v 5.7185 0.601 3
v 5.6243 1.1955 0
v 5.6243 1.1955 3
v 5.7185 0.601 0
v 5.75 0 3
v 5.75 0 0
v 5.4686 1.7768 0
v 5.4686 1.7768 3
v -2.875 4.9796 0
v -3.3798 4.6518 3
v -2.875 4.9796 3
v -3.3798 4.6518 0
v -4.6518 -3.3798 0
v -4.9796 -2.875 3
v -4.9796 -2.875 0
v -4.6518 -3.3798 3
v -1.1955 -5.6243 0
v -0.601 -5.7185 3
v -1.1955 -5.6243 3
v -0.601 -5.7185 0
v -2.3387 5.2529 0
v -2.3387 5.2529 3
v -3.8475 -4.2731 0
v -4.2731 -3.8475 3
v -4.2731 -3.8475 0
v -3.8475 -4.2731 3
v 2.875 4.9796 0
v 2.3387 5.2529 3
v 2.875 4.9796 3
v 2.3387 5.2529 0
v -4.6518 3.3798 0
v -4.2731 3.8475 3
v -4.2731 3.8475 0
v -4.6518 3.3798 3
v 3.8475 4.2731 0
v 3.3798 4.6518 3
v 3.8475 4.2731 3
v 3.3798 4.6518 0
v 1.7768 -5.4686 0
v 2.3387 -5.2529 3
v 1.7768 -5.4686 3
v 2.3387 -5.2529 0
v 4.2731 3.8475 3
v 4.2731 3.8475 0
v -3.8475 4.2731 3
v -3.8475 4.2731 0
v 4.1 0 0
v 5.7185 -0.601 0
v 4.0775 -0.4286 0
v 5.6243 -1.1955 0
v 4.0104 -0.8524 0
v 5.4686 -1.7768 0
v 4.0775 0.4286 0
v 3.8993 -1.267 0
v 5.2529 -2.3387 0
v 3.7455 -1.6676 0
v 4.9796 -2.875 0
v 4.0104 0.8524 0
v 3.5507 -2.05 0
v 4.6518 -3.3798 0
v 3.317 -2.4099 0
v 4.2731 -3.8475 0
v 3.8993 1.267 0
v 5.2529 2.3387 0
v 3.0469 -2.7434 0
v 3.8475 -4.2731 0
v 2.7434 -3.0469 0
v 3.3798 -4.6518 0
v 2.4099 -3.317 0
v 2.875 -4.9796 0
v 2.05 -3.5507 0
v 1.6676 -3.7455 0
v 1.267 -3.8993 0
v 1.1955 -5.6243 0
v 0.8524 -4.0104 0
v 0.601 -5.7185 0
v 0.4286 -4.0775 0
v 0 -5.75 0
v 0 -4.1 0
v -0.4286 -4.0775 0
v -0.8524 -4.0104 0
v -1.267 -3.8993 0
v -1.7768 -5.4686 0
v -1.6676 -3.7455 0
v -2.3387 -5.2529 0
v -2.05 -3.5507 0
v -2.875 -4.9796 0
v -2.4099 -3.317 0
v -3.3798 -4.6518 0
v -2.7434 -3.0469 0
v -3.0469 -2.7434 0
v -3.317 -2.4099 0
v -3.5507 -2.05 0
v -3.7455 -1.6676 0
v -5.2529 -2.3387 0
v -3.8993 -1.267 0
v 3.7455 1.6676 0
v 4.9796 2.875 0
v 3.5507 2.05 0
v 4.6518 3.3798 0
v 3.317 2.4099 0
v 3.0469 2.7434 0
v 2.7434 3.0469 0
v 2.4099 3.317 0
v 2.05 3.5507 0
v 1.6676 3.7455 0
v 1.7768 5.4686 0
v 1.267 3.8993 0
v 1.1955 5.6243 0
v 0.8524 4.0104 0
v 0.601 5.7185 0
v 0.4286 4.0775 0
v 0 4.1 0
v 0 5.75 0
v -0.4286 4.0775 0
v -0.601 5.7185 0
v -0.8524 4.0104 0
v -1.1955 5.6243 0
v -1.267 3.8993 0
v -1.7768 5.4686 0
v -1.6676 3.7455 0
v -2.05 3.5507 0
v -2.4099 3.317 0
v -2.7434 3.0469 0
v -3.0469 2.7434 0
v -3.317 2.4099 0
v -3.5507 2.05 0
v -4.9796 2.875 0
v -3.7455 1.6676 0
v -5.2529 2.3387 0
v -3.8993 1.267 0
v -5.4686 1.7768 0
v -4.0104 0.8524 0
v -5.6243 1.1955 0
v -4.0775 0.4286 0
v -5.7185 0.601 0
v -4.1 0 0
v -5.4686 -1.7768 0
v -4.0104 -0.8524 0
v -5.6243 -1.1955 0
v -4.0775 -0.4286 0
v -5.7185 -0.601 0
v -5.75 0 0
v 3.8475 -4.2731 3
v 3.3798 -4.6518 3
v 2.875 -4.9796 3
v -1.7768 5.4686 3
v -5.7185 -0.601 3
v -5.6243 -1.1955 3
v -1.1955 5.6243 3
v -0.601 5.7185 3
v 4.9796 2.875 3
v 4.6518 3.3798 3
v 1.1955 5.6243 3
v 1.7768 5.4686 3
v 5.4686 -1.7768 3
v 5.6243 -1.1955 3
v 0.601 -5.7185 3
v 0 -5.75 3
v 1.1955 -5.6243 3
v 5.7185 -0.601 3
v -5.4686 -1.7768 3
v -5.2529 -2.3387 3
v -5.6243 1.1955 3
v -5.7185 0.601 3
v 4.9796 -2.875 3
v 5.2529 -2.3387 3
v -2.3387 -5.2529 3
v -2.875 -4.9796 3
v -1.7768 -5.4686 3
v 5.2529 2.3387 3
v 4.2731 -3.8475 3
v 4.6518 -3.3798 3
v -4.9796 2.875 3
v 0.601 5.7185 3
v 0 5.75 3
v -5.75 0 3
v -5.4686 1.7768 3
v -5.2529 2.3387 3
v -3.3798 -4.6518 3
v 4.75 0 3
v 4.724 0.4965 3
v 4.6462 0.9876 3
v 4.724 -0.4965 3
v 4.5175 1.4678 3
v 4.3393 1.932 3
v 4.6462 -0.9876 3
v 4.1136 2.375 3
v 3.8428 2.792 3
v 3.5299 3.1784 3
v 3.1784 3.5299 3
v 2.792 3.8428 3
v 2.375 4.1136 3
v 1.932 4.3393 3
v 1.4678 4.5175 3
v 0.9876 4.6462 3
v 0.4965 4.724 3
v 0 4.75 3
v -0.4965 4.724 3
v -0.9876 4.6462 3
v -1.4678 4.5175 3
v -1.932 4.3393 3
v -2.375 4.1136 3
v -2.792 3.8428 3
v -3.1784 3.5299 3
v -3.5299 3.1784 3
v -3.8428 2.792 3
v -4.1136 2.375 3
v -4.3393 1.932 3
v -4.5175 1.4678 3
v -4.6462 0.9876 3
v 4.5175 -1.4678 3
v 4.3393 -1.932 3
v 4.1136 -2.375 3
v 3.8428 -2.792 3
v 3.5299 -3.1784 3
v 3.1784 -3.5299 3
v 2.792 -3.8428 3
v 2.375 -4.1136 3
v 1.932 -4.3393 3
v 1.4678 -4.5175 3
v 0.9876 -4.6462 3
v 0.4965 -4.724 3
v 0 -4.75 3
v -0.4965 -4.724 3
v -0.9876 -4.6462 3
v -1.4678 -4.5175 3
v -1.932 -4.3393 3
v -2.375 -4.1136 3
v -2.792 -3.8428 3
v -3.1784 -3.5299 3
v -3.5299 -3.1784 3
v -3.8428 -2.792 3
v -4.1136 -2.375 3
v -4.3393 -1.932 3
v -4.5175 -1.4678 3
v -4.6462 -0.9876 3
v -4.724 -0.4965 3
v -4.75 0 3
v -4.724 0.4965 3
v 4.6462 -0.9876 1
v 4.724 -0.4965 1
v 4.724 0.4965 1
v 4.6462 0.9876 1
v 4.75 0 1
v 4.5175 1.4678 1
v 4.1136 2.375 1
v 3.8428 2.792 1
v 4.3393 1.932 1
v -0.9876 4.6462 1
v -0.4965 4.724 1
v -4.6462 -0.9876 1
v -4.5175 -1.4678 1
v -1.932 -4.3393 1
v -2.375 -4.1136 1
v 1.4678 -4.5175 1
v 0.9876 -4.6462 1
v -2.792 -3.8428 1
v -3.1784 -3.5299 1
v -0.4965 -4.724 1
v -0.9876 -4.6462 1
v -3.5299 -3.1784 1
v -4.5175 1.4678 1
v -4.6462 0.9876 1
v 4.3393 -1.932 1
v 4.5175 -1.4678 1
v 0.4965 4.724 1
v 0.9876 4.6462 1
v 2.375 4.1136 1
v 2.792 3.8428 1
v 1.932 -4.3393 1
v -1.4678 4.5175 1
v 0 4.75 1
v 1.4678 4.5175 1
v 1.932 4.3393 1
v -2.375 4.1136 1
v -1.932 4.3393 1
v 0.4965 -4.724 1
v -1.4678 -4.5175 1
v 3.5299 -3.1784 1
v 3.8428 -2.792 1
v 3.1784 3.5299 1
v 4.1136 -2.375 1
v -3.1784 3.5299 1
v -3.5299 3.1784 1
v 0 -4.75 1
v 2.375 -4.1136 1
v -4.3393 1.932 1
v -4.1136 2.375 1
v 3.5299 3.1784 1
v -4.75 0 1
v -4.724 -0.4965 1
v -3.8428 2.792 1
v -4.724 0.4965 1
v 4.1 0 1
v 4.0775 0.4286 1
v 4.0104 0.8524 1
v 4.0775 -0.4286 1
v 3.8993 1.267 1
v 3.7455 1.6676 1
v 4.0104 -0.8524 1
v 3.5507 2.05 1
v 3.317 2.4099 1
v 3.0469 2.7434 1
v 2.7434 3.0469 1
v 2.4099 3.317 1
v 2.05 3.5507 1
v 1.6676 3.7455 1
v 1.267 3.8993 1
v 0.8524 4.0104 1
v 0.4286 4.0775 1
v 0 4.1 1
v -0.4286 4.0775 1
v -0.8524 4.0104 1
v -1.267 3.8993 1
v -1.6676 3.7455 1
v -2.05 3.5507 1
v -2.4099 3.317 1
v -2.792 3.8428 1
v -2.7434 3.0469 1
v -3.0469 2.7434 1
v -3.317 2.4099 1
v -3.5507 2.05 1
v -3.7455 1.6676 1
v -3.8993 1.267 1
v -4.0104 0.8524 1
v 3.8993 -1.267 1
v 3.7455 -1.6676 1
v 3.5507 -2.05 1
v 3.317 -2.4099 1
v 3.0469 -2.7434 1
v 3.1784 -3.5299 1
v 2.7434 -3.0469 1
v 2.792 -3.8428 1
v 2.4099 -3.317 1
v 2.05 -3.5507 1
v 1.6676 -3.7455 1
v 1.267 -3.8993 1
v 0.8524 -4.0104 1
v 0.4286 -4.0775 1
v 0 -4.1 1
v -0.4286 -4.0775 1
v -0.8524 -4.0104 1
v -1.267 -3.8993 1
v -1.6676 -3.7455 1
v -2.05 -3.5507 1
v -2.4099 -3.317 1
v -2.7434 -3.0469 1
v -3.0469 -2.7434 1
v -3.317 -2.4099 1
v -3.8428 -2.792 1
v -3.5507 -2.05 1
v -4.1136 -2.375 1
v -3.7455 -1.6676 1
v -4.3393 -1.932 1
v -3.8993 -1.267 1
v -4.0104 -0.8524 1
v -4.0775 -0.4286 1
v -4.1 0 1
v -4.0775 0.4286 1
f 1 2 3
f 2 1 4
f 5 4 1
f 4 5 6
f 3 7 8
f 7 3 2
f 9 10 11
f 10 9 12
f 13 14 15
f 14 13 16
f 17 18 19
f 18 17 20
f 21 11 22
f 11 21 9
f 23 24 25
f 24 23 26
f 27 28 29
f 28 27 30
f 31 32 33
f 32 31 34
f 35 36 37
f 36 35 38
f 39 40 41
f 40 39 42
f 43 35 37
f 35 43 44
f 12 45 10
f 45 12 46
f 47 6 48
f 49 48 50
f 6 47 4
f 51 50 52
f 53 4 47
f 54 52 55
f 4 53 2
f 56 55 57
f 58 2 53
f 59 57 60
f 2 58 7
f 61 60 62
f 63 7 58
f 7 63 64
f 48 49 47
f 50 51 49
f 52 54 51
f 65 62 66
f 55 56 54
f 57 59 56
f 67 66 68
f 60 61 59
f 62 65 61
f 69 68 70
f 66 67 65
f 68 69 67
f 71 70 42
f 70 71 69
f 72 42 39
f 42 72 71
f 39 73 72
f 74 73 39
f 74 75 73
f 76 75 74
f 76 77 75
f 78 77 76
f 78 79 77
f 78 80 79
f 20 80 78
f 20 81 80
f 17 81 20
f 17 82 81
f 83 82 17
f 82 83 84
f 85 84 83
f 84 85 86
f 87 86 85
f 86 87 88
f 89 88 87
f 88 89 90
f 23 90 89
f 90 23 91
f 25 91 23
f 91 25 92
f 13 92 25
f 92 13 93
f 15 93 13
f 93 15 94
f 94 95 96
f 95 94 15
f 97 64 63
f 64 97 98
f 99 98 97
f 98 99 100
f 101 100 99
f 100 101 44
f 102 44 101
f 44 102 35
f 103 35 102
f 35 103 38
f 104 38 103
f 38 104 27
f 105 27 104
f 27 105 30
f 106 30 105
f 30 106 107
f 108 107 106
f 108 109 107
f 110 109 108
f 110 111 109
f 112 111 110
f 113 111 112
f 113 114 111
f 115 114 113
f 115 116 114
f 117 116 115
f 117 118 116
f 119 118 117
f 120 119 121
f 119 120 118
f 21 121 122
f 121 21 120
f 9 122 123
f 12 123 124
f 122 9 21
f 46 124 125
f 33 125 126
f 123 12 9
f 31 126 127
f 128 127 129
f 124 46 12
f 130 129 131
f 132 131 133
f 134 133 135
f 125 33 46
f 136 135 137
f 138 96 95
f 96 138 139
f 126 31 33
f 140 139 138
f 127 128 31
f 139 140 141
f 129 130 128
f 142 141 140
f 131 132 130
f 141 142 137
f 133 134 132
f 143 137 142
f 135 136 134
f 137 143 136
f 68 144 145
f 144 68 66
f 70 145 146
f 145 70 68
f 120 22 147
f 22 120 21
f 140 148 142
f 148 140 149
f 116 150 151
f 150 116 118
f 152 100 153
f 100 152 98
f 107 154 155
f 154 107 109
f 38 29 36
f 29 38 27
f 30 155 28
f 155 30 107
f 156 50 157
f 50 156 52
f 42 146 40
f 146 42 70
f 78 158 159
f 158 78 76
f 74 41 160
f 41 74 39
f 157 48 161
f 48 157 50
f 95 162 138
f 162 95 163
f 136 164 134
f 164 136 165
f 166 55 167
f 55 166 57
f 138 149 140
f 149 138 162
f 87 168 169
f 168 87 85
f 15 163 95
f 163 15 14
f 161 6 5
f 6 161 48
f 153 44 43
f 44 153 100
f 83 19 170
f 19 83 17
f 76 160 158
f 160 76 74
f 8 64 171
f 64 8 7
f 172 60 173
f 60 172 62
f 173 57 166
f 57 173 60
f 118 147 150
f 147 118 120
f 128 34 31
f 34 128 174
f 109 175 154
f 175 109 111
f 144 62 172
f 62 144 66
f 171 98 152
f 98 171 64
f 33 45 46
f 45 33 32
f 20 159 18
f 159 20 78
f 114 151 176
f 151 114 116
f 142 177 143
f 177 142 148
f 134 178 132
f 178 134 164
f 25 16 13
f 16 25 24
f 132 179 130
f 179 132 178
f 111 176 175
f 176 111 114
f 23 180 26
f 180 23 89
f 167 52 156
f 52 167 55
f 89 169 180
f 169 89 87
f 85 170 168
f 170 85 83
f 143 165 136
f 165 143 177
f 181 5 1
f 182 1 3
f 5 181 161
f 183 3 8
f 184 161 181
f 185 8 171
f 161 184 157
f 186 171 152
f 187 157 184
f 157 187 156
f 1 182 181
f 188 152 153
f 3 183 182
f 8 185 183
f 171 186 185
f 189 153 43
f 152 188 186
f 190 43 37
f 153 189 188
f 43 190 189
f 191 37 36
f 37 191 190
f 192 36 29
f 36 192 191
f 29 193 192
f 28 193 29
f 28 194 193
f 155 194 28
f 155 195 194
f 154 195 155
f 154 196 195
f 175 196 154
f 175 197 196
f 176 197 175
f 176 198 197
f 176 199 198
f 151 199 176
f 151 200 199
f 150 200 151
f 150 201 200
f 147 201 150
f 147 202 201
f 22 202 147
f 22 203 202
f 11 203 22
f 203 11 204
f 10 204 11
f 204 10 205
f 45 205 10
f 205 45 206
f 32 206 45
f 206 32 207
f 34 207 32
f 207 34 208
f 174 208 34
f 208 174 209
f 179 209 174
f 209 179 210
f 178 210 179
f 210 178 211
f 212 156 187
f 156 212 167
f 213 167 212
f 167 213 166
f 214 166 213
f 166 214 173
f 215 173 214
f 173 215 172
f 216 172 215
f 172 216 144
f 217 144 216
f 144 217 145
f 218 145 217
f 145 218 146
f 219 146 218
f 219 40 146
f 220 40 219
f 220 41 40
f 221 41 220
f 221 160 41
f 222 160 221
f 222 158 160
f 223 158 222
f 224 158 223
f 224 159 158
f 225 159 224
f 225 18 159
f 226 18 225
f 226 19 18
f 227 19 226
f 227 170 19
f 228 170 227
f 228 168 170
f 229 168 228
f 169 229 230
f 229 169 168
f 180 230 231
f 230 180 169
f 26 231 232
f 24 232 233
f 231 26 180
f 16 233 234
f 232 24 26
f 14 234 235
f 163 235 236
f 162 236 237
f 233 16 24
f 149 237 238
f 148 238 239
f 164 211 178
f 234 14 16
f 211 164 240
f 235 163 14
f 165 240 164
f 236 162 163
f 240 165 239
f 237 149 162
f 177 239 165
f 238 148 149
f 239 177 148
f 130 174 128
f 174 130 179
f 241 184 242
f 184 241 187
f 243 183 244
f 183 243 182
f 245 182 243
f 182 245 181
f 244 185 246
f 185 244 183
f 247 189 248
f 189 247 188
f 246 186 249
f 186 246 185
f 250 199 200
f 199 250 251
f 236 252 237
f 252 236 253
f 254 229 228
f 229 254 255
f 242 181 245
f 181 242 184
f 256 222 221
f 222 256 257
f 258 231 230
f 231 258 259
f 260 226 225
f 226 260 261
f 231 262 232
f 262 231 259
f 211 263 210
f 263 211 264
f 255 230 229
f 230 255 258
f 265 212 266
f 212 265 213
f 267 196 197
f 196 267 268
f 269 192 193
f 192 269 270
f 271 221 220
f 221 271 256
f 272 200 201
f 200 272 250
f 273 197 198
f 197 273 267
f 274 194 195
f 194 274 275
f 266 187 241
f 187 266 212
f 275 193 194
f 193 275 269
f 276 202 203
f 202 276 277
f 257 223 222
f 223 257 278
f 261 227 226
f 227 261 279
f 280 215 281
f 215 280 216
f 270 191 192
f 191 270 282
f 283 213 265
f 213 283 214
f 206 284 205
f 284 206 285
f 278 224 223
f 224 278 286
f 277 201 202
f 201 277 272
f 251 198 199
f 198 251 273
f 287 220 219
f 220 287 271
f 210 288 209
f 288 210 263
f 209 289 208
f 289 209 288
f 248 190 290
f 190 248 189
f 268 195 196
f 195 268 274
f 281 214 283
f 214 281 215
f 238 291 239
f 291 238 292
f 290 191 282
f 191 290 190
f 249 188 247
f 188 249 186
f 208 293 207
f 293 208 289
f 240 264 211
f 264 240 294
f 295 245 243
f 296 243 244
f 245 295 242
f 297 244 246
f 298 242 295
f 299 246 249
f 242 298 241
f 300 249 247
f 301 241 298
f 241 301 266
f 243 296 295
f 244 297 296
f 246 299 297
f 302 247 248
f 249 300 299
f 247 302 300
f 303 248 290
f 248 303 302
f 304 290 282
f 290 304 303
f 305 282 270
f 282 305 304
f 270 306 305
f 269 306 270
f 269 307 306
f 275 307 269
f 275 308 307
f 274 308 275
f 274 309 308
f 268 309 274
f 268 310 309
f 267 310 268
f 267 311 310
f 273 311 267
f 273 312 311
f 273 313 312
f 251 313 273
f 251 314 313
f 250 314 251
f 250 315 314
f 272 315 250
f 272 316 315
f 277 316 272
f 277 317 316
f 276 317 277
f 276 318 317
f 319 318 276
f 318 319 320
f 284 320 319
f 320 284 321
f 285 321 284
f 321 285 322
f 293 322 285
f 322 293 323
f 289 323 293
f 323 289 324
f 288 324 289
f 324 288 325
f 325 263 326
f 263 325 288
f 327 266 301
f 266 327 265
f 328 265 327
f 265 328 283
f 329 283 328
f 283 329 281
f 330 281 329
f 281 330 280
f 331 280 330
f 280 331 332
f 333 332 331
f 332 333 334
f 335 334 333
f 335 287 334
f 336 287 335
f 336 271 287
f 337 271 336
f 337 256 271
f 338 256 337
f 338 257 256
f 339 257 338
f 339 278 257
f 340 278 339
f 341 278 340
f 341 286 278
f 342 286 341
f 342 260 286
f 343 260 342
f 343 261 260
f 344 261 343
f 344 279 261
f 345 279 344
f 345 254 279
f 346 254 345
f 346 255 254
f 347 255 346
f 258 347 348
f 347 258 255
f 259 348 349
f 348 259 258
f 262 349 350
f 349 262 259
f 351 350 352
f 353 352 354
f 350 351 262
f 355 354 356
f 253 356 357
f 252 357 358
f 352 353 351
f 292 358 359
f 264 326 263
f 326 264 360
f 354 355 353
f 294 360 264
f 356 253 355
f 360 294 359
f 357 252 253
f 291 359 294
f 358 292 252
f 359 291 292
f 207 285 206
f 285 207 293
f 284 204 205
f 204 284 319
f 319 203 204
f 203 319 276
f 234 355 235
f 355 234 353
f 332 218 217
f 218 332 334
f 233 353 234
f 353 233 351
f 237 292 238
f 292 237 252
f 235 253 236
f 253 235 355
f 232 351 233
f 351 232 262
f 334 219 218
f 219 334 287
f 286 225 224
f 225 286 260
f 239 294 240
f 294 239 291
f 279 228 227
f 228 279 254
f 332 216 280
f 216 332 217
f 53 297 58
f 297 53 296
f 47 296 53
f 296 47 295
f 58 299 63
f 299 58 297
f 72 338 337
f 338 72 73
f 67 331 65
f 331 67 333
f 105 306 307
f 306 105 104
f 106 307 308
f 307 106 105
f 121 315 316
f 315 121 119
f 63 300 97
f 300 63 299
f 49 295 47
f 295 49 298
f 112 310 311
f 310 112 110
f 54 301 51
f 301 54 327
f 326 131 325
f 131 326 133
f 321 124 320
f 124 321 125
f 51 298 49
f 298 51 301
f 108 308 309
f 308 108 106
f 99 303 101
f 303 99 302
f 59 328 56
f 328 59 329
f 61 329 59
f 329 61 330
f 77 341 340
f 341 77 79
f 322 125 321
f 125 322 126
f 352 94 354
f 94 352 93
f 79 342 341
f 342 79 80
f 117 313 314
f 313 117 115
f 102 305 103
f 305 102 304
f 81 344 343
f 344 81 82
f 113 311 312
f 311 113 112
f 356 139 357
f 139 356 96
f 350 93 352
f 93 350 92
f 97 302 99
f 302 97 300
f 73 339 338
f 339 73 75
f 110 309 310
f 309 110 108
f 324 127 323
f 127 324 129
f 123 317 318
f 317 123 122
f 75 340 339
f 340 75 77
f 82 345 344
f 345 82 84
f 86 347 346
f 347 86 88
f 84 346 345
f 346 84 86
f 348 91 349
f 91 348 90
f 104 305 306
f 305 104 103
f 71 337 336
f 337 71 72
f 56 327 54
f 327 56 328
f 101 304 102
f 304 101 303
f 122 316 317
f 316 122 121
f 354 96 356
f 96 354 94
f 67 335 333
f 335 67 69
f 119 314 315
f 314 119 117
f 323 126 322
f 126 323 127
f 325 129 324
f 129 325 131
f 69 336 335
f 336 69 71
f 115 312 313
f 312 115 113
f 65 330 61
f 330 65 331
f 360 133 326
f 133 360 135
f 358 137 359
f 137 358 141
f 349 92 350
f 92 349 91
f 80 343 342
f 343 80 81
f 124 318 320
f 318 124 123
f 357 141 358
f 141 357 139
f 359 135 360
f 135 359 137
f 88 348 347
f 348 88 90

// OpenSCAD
difference(){
cylinder(r=11.5/2,h=3,$fn=60);
translate([0,0,1])cylinder(r=9.5/2,h=5,$fn=60);
translate([0,0,-1])cylinder(r=8.2/2,h=5,$fn=60);
}
